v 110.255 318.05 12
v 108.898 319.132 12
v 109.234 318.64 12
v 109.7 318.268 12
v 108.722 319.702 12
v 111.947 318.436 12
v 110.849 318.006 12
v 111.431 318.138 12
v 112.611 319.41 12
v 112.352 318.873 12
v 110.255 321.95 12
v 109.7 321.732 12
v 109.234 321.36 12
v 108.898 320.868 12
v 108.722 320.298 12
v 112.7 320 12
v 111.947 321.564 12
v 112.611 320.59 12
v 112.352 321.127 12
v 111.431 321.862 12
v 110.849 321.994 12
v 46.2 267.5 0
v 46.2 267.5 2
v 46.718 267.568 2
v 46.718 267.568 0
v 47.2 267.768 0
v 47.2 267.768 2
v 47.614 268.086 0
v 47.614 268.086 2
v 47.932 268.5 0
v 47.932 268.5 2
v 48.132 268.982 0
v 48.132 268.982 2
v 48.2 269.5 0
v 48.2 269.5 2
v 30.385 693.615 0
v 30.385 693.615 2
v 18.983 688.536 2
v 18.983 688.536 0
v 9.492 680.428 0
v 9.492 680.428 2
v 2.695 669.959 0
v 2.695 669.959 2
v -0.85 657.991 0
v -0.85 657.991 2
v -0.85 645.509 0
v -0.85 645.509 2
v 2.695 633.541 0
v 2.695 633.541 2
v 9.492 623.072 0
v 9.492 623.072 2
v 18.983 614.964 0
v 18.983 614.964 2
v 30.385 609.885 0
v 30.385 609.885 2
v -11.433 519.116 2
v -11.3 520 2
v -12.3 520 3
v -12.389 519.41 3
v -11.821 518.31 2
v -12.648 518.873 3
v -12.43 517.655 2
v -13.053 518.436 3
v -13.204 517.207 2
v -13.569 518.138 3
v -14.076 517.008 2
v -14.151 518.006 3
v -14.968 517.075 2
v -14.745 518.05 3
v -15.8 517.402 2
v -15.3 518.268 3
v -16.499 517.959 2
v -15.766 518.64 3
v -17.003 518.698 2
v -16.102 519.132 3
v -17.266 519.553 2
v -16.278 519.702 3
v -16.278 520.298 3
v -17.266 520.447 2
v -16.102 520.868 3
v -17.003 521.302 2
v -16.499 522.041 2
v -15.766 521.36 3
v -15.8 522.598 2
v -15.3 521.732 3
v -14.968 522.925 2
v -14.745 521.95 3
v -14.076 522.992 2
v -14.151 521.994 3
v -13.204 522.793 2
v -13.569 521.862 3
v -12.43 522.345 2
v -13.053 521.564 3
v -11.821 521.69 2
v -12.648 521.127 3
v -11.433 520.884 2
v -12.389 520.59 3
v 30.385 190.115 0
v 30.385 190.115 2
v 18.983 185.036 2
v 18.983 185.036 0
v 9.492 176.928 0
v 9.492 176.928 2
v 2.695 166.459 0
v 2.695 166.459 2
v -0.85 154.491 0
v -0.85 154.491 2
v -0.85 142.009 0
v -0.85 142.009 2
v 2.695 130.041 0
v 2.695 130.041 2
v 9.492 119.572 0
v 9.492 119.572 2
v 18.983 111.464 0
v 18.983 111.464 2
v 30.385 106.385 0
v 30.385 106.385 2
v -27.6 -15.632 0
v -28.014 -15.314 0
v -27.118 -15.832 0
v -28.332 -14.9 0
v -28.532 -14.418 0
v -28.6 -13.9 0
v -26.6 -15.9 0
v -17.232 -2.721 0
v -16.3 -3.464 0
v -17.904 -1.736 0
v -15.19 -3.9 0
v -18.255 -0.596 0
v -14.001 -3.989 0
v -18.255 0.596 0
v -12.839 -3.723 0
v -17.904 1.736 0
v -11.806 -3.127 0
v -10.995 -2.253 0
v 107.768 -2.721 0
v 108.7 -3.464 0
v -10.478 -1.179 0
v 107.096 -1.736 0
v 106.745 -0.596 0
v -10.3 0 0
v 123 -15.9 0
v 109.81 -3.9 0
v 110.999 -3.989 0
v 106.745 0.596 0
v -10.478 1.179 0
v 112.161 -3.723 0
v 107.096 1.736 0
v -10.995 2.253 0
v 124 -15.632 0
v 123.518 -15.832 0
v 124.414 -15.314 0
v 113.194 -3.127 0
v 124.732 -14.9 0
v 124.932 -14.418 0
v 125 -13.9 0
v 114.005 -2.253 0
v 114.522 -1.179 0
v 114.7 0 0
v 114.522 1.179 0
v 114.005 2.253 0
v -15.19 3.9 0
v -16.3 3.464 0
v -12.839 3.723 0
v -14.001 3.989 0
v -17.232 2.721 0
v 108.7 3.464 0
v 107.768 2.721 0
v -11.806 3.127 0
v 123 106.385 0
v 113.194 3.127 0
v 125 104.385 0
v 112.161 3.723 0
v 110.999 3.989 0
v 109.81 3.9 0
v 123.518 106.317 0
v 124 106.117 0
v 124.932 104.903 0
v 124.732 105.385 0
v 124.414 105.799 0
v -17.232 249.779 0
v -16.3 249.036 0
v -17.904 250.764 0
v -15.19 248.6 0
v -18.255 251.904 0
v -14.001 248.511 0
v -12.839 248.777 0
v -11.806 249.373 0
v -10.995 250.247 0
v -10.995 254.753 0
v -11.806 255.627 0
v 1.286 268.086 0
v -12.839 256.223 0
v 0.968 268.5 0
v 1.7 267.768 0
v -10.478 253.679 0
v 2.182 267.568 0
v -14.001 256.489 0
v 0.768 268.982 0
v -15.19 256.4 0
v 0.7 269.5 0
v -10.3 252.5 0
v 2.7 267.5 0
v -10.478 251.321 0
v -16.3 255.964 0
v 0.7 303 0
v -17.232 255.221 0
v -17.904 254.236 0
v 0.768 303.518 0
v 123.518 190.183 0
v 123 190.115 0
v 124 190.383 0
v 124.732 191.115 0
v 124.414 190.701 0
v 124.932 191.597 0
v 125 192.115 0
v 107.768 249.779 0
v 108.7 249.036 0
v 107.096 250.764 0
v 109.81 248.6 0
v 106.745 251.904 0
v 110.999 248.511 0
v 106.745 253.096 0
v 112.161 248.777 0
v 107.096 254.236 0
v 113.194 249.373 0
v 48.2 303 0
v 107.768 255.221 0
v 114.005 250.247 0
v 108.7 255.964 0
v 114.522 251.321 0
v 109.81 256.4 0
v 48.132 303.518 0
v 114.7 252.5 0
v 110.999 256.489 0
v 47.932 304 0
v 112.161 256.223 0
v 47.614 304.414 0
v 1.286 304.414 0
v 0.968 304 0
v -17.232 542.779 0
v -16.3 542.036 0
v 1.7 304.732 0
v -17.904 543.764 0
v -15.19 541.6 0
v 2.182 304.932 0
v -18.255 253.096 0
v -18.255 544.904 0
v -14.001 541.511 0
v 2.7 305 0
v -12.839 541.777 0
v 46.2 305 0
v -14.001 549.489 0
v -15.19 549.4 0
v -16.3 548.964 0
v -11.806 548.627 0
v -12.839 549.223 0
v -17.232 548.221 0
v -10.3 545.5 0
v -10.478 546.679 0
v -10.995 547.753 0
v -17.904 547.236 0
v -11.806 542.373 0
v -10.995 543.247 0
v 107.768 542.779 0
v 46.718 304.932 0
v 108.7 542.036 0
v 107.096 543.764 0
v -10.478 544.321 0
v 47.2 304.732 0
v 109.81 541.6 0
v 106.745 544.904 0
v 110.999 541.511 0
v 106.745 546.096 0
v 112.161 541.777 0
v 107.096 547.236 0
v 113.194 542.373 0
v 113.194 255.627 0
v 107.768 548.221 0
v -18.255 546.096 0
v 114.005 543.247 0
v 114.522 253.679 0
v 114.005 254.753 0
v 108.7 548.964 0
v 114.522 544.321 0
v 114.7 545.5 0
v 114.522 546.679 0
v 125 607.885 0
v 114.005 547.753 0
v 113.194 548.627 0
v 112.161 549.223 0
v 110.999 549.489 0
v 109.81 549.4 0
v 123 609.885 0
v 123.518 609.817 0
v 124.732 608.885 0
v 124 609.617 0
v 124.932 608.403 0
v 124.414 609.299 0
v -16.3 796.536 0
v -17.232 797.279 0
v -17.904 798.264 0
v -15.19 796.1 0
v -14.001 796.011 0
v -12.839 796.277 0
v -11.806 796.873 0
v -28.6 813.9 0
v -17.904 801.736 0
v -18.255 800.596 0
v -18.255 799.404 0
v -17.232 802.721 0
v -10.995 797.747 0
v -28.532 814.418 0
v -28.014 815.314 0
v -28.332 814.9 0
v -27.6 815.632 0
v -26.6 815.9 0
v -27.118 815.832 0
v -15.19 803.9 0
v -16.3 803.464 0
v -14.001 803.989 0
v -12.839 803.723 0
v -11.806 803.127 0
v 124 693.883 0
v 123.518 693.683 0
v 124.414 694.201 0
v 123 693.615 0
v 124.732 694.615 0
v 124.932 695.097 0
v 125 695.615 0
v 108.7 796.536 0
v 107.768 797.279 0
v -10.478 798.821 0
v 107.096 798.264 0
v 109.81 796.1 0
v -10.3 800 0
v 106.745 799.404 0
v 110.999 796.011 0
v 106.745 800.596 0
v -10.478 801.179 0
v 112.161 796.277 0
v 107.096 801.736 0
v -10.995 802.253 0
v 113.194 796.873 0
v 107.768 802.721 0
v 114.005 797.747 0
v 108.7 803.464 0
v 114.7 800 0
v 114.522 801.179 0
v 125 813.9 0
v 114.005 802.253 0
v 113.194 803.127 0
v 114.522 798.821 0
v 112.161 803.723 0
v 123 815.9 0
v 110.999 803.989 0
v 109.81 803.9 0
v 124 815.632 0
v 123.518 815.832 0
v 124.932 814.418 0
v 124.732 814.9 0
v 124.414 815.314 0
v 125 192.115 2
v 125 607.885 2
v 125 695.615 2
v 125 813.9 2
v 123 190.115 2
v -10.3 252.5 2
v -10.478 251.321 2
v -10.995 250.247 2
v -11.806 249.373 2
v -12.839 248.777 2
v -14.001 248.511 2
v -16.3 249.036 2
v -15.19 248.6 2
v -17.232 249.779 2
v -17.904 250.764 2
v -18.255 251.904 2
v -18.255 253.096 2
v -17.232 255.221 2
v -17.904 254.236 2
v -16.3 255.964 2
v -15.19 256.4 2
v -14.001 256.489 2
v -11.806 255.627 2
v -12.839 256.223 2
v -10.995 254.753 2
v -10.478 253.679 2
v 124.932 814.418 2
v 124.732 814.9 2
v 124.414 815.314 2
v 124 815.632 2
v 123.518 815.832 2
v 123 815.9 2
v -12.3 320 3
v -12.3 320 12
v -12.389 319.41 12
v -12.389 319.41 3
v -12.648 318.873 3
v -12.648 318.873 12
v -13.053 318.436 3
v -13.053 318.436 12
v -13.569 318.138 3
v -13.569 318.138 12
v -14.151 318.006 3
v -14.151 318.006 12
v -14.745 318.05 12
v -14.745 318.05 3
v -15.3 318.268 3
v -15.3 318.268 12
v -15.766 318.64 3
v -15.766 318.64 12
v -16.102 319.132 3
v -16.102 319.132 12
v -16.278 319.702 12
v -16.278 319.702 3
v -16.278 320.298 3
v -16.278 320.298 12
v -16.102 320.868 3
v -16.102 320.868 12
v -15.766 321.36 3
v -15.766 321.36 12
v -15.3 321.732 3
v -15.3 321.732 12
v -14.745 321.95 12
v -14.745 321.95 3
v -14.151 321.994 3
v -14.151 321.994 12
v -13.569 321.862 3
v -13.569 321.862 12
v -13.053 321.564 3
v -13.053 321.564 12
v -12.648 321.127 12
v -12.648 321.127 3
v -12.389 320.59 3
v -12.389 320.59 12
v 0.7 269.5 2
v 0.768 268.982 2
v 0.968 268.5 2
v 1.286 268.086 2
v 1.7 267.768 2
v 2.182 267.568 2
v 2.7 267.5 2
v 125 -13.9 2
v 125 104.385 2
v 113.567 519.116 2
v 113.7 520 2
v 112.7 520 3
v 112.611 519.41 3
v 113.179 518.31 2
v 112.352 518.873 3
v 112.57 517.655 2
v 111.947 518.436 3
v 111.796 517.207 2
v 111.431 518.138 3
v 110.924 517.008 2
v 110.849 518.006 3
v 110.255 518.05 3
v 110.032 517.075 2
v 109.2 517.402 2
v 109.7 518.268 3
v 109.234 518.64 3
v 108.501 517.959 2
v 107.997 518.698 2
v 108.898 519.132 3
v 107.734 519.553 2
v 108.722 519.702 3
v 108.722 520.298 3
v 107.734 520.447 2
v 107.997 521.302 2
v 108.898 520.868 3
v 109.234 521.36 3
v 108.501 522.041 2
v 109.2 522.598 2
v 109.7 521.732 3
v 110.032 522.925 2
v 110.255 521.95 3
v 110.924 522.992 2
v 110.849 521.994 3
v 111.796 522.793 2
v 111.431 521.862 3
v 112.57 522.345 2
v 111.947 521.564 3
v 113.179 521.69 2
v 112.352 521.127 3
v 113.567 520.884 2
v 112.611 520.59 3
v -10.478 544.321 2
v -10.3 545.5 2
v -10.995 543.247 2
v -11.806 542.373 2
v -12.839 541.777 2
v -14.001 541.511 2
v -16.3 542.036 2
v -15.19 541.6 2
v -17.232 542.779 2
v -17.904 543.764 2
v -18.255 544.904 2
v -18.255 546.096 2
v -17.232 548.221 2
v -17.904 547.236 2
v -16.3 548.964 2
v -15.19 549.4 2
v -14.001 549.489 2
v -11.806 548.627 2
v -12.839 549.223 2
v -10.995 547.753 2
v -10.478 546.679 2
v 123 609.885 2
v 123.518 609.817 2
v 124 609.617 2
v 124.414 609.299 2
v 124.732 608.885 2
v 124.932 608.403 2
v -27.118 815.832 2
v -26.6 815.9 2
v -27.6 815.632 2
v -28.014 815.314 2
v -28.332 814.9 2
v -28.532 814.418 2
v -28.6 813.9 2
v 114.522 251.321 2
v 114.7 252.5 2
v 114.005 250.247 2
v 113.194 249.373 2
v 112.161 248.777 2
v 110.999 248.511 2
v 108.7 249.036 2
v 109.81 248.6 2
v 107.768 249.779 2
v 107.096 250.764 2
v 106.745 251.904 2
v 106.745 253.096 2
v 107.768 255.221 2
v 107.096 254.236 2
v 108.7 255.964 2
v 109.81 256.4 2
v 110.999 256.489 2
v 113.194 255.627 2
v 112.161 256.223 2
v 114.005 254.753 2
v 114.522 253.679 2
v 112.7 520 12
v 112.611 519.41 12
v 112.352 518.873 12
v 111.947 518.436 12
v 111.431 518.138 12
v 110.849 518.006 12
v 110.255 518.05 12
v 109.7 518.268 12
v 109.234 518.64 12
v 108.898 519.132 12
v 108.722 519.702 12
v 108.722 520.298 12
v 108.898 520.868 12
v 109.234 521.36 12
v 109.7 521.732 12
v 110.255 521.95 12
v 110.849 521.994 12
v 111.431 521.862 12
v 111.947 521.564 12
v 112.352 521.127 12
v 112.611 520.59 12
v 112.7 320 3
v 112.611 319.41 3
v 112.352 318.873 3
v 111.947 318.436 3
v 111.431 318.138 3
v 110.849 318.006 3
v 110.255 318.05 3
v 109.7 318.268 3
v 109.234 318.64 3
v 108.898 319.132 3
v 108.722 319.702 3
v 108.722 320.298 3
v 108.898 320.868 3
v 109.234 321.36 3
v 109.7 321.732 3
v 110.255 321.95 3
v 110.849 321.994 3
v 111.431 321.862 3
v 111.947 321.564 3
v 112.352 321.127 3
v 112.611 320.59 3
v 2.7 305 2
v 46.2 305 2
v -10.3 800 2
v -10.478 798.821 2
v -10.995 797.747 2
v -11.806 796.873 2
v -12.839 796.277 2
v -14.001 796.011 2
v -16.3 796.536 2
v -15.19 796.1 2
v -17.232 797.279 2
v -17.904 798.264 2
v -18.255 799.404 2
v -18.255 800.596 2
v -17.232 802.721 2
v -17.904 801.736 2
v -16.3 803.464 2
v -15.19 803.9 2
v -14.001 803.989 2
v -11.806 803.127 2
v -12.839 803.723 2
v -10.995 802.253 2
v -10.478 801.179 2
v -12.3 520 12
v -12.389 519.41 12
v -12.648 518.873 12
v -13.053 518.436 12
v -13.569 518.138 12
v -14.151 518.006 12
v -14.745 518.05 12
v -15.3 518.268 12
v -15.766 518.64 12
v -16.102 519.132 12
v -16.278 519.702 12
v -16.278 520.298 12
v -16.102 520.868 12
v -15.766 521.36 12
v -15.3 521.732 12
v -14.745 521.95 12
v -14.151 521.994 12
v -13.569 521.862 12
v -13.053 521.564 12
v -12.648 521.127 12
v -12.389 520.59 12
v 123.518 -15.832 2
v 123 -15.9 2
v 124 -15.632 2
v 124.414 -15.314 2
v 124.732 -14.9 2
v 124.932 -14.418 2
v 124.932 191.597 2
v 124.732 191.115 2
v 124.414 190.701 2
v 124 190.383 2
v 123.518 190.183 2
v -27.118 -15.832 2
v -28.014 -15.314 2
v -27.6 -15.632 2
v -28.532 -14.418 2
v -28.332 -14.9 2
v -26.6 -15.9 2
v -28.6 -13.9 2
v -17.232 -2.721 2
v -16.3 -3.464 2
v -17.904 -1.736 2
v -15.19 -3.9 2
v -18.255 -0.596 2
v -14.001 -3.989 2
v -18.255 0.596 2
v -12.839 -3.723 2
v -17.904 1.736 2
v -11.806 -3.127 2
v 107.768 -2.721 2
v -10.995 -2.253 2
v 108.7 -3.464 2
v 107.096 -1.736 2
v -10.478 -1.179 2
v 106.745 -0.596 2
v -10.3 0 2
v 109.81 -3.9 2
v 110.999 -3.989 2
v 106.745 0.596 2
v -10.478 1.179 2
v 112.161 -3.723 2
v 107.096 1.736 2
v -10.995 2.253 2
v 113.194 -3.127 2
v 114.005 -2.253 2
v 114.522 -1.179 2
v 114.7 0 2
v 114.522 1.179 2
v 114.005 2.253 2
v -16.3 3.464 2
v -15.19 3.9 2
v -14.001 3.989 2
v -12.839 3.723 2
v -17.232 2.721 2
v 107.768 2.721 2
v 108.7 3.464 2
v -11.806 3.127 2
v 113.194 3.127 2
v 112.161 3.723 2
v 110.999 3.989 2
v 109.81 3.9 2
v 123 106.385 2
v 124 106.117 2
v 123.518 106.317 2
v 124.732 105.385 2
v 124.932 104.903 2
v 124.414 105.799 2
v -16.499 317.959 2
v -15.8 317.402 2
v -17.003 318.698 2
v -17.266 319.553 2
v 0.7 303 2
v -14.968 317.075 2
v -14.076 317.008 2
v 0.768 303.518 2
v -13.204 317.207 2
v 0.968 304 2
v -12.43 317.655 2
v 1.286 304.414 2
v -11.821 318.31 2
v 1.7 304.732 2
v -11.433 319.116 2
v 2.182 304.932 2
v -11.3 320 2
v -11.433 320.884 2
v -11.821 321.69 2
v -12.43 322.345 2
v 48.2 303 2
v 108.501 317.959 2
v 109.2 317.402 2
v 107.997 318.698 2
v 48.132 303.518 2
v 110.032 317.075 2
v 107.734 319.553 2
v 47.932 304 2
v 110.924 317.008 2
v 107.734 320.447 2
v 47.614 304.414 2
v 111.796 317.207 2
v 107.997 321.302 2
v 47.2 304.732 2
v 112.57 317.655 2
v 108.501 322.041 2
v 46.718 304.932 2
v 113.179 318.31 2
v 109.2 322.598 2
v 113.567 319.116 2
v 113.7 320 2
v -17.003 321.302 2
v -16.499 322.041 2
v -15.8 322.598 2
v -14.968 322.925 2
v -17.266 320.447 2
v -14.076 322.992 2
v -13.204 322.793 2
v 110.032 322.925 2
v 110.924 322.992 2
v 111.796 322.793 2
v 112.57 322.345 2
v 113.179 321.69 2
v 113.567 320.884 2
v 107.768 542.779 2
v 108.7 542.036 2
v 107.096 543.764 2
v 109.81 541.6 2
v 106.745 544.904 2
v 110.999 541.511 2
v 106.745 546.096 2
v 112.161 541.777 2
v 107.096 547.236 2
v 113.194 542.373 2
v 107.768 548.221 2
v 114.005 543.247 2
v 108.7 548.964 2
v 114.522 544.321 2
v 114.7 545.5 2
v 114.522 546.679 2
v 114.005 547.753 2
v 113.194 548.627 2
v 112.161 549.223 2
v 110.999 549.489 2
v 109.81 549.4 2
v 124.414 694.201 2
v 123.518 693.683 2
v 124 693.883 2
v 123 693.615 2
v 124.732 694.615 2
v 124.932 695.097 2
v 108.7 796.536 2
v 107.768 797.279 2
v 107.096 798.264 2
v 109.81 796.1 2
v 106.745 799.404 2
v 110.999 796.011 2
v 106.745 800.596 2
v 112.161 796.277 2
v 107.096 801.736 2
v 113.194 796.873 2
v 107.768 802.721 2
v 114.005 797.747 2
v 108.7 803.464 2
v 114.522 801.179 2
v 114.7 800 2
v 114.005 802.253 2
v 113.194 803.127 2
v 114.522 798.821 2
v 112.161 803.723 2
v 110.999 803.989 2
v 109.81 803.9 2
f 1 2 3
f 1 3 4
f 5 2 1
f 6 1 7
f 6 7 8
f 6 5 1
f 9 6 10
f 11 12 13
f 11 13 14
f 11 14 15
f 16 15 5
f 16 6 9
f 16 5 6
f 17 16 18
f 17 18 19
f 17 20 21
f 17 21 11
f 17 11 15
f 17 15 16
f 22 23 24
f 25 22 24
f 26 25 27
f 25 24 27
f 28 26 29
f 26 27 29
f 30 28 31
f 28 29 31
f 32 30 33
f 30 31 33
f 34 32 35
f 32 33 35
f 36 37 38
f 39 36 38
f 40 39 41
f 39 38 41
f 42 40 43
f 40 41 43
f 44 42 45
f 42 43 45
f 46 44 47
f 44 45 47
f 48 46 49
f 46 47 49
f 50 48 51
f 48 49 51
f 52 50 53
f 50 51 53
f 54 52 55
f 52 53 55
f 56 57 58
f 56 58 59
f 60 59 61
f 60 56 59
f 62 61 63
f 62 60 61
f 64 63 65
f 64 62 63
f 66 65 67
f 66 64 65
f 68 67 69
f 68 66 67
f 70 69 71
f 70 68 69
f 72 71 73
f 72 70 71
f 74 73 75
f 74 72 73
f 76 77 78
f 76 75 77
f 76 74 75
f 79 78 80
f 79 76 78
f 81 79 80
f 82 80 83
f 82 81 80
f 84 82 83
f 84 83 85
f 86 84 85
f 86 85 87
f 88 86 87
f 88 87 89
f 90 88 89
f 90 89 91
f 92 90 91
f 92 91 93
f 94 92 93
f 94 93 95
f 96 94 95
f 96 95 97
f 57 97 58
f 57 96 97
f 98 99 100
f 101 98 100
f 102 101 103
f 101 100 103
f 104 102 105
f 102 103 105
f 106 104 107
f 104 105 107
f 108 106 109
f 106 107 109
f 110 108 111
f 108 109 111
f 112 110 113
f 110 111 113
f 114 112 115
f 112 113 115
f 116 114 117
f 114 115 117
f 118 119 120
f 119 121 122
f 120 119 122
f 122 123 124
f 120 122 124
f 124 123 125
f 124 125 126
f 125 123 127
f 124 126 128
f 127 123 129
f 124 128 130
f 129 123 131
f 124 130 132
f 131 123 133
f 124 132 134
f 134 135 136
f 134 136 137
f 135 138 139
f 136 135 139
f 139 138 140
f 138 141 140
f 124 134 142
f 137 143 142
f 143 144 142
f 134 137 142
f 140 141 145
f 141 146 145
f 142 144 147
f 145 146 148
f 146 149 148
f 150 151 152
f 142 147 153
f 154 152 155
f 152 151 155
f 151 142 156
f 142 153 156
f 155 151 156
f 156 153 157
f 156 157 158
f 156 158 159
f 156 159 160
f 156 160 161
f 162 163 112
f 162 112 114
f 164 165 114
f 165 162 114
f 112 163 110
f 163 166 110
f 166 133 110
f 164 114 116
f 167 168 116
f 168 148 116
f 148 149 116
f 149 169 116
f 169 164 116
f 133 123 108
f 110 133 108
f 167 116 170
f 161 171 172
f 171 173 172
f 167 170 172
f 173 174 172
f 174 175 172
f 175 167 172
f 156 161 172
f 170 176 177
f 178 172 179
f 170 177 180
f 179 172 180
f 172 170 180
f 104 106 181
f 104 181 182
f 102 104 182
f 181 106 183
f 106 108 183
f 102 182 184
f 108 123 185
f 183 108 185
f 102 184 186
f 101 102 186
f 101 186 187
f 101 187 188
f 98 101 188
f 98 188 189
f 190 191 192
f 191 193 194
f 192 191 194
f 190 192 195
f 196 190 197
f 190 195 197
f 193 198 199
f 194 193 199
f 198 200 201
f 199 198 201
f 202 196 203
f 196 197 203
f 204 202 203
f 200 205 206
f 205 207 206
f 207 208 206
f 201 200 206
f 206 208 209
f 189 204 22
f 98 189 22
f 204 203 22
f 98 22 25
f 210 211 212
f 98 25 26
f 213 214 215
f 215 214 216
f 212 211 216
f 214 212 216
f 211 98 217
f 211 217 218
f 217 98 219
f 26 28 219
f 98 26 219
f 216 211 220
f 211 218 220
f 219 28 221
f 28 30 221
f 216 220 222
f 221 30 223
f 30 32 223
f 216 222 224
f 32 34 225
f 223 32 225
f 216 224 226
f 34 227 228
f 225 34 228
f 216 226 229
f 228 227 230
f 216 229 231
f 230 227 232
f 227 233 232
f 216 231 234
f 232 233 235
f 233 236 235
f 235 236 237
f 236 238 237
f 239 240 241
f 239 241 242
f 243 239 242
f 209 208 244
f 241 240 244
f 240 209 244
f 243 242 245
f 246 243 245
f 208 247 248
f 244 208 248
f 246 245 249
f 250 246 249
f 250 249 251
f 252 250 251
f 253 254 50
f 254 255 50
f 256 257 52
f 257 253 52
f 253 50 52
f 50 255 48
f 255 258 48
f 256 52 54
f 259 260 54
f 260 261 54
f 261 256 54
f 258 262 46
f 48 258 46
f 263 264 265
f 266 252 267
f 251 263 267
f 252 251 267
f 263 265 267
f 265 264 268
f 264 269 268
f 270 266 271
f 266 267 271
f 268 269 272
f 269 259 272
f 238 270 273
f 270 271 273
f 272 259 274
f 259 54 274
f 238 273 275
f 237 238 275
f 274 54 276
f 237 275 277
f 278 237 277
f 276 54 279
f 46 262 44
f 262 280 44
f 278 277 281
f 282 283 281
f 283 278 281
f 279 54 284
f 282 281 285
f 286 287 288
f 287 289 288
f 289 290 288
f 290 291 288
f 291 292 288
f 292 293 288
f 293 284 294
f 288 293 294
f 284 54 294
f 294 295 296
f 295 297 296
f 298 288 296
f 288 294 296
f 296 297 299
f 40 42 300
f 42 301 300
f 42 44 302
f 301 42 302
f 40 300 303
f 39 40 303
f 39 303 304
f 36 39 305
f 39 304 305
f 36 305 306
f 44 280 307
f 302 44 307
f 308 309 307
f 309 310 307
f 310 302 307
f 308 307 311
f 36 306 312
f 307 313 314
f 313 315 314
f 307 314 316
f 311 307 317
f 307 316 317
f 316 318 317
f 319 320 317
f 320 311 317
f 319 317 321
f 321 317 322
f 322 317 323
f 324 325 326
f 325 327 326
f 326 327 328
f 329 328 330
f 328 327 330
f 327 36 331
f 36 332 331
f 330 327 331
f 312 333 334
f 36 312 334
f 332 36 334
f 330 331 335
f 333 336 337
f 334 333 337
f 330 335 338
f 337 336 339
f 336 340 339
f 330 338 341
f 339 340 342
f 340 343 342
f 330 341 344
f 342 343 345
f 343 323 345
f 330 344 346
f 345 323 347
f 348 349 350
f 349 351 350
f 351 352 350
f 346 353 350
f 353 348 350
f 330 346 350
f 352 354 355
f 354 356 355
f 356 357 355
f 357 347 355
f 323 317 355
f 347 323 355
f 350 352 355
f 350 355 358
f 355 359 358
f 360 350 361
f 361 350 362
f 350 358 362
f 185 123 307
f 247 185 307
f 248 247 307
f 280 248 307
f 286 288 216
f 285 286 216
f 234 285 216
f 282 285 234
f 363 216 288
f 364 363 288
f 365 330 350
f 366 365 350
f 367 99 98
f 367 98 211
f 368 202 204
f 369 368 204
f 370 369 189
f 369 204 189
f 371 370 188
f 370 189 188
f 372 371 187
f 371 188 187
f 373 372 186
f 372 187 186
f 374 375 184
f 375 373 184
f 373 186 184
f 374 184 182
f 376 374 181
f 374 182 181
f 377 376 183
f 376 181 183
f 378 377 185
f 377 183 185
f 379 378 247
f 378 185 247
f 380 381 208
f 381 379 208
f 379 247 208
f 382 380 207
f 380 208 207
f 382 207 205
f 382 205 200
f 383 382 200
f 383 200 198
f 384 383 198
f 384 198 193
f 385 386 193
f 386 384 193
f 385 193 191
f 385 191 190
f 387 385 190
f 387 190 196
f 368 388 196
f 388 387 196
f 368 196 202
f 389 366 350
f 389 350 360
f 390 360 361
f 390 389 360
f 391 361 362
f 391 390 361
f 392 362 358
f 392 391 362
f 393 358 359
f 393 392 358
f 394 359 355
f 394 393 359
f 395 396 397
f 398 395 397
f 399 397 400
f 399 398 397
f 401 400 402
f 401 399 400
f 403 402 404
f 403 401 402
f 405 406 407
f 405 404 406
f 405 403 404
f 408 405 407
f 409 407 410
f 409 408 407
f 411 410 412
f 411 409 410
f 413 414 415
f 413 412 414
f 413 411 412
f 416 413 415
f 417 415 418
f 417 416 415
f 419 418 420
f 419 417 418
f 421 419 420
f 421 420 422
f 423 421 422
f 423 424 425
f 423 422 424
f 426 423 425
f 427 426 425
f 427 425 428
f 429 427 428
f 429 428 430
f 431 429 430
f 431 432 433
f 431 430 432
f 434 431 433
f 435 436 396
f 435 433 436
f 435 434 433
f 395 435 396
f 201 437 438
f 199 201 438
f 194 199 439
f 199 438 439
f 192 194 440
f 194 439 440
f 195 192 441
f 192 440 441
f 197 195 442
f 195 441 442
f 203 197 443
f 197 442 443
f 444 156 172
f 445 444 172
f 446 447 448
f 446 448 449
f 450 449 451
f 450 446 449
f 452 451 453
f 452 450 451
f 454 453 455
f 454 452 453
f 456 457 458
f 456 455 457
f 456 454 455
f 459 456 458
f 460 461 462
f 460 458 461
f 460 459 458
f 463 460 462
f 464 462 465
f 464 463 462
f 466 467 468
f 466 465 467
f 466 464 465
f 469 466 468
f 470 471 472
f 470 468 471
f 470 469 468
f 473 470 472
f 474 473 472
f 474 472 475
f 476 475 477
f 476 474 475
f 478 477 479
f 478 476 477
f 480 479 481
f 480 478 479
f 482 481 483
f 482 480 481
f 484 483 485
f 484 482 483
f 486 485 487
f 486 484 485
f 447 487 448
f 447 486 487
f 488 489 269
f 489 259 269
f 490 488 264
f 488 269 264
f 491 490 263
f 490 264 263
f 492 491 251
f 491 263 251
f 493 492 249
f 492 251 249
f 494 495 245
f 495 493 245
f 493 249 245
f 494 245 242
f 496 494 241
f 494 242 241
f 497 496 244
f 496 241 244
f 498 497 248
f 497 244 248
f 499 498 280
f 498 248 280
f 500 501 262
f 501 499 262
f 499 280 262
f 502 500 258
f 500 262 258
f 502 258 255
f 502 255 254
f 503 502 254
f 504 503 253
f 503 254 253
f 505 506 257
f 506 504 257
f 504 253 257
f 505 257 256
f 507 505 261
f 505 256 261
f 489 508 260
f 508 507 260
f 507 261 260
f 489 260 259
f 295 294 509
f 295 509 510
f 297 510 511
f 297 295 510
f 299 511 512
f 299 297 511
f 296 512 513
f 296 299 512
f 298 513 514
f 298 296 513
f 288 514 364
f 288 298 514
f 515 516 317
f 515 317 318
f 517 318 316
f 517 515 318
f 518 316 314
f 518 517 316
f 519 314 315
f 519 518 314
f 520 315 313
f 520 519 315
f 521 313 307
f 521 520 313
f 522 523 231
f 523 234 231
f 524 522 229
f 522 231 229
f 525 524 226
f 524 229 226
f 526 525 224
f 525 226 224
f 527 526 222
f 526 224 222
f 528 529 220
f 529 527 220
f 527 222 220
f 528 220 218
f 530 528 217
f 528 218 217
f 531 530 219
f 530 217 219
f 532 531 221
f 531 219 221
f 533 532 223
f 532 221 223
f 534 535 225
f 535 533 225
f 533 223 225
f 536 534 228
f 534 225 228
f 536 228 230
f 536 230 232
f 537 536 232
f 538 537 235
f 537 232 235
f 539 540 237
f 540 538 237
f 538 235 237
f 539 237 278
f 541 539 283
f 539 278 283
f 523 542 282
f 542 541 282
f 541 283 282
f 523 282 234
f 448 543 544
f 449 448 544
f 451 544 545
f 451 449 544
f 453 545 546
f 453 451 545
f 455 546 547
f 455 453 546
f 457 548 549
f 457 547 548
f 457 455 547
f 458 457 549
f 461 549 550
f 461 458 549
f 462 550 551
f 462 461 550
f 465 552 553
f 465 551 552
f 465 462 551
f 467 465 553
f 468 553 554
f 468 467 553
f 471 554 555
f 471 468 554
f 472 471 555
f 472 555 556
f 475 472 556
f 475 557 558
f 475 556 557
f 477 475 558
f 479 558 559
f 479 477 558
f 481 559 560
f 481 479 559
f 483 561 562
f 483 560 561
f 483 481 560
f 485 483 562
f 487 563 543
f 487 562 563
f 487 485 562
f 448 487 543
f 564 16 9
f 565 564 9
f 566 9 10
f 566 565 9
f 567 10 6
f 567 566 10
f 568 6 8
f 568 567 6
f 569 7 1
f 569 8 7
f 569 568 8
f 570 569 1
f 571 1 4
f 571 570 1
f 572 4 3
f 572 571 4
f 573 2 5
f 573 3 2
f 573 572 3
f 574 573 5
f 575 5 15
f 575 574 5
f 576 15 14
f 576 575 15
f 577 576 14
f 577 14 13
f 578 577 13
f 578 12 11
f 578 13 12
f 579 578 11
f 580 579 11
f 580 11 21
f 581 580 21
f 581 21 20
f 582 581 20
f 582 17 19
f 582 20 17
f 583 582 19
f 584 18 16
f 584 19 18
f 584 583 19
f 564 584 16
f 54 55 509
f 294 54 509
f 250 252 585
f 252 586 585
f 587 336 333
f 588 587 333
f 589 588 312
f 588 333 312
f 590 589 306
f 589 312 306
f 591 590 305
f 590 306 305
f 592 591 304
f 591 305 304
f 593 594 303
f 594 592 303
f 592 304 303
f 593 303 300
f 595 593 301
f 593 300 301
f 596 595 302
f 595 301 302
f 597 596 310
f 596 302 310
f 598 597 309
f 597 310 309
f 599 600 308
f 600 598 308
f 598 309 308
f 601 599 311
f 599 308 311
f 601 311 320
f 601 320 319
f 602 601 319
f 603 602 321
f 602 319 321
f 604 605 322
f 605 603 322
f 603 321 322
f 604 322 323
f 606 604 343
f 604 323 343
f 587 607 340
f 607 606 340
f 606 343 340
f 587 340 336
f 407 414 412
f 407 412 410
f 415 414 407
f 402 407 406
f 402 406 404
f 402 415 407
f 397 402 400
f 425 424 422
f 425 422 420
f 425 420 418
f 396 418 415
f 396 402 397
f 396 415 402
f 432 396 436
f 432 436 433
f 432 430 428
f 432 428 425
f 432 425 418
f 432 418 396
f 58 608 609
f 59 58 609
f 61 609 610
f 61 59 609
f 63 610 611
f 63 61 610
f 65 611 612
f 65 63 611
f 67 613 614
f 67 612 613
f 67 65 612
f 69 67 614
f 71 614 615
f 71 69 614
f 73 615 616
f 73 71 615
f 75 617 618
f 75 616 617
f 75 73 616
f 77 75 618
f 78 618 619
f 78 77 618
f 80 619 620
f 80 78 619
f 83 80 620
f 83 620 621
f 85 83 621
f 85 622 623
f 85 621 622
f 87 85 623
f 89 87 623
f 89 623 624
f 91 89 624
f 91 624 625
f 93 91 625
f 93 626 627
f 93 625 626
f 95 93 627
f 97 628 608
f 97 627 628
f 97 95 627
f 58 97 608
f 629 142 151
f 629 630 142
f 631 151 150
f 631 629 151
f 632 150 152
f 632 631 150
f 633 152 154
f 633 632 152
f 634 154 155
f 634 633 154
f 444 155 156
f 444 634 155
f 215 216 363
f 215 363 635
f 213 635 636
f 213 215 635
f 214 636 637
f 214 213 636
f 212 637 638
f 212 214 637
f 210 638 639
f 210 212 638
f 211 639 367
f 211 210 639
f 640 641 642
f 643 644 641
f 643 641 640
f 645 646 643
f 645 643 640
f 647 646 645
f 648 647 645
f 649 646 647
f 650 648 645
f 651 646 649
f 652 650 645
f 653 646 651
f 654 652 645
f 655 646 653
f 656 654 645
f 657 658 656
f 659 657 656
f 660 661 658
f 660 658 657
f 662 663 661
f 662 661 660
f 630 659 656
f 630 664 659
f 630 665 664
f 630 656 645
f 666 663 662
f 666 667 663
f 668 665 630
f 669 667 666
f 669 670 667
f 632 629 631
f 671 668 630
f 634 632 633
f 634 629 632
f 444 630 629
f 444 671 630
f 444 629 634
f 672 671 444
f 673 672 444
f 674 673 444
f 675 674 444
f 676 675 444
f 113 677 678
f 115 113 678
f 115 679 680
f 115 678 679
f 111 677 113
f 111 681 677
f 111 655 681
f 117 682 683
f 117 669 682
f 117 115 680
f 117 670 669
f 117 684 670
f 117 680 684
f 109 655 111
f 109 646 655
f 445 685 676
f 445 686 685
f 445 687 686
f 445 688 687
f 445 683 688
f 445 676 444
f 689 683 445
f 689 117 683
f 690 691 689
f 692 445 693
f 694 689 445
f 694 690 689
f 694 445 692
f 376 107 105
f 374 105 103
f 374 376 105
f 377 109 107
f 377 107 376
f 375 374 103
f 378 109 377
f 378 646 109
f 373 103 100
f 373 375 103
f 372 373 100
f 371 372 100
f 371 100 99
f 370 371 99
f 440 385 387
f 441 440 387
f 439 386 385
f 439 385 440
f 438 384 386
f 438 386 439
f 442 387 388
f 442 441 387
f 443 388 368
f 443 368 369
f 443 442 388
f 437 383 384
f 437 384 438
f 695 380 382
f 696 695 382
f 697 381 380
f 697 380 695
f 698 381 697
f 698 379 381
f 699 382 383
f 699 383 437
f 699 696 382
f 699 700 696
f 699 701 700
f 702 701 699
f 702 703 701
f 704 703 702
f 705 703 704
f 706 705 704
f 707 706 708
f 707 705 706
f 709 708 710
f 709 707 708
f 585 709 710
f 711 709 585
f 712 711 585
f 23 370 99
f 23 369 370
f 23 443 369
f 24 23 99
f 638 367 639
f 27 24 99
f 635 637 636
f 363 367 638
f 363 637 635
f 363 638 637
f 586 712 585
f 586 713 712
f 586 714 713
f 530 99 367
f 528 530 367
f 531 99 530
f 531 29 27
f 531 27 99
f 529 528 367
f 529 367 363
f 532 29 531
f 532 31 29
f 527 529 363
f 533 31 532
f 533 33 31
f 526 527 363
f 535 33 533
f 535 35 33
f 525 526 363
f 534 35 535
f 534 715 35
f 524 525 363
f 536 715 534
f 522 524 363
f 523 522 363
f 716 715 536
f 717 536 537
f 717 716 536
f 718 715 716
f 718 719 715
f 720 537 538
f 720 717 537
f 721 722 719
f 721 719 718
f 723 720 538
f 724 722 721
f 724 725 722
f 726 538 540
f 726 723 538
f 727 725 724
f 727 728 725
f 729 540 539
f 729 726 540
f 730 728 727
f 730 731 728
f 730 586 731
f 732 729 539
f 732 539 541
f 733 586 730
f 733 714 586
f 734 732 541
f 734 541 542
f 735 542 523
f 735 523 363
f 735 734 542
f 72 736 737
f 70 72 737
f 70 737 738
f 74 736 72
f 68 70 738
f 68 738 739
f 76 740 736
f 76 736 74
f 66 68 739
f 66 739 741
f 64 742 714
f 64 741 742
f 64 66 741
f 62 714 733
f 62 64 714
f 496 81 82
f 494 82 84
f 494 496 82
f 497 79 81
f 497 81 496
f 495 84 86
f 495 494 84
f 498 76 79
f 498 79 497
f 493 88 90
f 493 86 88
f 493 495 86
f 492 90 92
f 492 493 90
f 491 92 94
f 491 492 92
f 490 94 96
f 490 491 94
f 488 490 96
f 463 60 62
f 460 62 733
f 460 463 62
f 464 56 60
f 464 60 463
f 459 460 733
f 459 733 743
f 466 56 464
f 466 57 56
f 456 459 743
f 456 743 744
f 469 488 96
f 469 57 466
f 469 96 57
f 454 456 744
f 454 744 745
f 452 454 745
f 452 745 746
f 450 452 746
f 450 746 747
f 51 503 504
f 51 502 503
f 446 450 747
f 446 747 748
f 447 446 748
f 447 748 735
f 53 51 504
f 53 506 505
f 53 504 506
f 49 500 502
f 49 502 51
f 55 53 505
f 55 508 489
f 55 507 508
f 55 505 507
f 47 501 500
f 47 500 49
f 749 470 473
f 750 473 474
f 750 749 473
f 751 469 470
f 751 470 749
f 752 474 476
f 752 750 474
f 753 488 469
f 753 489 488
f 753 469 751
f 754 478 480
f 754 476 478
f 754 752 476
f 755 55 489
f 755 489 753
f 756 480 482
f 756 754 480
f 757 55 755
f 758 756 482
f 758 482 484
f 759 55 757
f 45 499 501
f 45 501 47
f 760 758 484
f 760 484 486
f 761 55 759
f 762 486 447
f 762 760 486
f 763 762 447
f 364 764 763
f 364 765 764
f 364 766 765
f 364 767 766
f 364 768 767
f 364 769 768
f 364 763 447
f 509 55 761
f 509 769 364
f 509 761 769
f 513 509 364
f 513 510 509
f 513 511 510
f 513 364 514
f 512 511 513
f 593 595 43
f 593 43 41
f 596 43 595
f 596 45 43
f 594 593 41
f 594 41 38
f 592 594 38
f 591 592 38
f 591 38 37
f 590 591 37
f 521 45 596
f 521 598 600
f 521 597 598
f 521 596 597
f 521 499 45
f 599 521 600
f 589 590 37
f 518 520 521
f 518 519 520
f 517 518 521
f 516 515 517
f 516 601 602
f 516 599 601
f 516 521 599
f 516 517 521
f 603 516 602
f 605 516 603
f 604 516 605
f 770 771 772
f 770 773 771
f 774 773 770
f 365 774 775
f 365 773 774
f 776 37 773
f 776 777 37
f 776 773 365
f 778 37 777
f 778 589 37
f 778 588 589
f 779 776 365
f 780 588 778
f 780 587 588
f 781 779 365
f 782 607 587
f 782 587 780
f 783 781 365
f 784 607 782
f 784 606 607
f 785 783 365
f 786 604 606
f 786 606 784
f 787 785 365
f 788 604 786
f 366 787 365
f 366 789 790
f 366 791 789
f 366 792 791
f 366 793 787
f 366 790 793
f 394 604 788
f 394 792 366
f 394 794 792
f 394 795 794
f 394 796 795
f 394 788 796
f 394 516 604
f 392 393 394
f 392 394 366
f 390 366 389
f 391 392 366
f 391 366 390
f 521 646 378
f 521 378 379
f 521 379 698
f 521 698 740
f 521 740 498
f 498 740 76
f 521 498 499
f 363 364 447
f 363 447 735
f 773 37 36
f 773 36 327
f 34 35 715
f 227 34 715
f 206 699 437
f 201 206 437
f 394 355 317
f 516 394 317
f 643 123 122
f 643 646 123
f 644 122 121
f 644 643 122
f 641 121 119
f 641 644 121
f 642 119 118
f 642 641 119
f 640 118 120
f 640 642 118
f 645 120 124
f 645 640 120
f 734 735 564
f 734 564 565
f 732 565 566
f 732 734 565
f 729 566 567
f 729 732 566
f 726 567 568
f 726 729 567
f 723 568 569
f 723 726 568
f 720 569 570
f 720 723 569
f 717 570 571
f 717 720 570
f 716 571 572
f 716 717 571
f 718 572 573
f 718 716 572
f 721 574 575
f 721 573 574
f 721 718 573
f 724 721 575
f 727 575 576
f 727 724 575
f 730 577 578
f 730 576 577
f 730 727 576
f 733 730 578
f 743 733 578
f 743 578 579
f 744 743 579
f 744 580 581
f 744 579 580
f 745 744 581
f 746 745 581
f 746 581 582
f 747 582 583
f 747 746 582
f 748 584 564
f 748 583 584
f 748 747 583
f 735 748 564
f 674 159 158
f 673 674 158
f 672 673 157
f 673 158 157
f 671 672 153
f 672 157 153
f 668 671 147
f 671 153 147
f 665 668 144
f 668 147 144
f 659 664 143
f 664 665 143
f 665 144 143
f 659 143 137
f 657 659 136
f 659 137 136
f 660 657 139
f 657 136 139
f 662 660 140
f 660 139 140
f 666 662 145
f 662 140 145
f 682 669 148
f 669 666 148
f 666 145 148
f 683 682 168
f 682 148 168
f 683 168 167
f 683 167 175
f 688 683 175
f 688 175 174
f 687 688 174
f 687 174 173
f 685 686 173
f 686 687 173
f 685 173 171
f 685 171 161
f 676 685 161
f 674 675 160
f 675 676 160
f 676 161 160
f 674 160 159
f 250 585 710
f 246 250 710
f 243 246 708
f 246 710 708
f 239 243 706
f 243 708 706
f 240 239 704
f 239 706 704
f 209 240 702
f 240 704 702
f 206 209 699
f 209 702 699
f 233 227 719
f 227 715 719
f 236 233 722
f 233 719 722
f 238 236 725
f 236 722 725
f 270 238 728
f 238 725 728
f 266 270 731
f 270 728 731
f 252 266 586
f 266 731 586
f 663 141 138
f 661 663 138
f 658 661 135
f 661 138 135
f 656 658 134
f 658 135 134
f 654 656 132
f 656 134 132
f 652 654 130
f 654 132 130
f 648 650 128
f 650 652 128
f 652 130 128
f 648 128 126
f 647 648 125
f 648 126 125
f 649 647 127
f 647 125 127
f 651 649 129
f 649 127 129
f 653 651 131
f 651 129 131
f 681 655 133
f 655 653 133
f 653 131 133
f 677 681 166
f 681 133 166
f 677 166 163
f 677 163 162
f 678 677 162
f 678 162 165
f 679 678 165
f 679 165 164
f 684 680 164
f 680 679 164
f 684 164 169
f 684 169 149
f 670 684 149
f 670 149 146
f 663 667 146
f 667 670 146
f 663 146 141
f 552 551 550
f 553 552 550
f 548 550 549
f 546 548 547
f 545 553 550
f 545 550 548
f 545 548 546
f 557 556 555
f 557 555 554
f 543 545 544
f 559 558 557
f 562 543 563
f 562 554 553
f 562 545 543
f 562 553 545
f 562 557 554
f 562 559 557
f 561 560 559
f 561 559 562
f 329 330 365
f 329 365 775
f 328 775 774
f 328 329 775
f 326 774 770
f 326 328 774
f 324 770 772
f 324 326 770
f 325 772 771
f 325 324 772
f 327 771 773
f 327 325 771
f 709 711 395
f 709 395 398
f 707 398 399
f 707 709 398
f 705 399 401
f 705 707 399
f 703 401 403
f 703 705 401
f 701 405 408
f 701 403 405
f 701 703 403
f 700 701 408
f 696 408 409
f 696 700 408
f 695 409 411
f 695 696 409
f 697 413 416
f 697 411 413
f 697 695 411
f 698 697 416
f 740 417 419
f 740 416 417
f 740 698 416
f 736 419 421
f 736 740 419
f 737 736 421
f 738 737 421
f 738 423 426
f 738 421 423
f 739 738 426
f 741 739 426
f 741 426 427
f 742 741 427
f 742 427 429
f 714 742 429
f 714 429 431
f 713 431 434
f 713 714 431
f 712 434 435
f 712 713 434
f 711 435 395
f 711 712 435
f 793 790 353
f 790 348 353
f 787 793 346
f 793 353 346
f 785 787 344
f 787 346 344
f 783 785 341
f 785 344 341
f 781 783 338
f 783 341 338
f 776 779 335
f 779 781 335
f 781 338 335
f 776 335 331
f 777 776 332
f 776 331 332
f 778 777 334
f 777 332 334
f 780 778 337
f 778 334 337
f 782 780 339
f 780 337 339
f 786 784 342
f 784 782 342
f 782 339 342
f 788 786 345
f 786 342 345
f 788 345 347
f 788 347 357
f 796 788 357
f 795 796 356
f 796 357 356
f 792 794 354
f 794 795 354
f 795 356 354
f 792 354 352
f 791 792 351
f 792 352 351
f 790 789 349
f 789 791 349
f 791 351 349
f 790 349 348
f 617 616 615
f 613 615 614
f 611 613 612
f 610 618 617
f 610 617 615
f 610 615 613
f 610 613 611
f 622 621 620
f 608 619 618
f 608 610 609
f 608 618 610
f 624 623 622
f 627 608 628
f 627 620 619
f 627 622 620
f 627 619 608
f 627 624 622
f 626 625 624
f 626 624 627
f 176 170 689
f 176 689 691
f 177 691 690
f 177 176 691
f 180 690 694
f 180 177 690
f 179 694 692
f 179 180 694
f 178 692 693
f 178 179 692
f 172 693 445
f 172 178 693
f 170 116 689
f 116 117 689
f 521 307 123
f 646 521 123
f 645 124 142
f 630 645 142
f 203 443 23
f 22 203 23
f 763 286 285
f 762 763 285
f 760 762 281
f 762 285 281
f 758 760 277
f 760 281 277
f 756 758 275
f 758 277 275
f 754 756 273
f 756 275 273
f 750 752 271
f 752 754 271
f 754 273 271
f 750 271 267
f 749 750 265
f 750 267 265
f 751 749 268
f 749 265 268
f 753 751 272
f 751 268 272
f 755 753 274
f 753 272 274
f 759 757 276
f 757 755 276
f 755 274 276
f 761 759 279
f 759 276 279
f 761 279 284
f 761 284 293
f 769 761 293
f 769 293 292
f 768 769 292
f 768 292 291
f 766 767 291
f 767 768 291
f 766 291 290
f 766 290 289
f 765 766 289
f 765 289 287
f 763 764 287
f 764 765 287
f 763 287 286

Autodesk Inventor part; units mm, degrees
ref_plane "YZ Plane" through (0, 0, 0) normal (1, 0, 0) x (0, 1, 0)
ref_plane "XZ Plane" through (0, 0, 0) normal (0, 1, 0) x (-1, 0, 0)
ref_plane "XY Plane" through (0, 0, 0) normal (0, 0, 1) x (1, 0, 0)
sketch "Sketch1" plane through (0, 0, 0) normal (0, 0, 1) x (1, 0, 0)
  line L0 (-28.6, -15.9) -> (0, -15.9) construction
  line L1 (-28.6, 817.5) -> (-28.6, -17.5) construction
  line L2 (125, 817.5) -> (125, -17.5) construction
  line L3 (96.4, -15.9) -> (125, -15.9) construction
  line L4 (-28.6, 815.9) -> (0, 815.9) construction
  line L5 (96.4, 815.9) -> (125, 815.9) construction
  circle A0 centre (-14.3, 0) radius 2 construction
  circle A1 centre (110.7, 0) radius 2 construction
  circle A2 centre (-14.3, 252.5) radius 2 construction
  circle A3 centre (110.7, 252.5) radius 2 construction
  circle A4 centre (-14.3, 545.5) radius 2 construction
  circle A5 centre (110.7, 545.5) radius 2 construction
  circle A6 centre (-14.3, 800) radius 2 construction
  circle A7 centre (110.7, 800) radius 2 construction
  line L6 (-28.6, -15.9) -> (125, -15.9)
  line L7 (125, -15.9) -> (125, 815.9)
  line L8 (125, 815.9) -> (-28.6, 815.9)
  line L9 (-28.6, 815.9) -> (-28.6, -15.9)
  circle A8 centre (-14.3, 0) radius 4
  circle A9 centre (110.7, 0) radius 4
  circle A10 centre (-14.3, 252.5) radius 4
  circle A11 centre (110.7, 252.5) radius 4
  circle A12 centre (-14.3, 545.5) radius 4
  circle A13 centre (110.7, 545.5) radius 4
  circle A14 centre (-14.3, 800) radius 4
  circle A15 centre (110.7, 800) radius 4
  point P0 (0, 0)
  dimension "d0" = 2
  dimension "d1" = 2
  dimension "d2" = 2
  dimension "d3" = 2
  dimension "d4" = 2
  dimension "d5" = 2
  dimension "d6" = 2
  dimension "d7" = 2
extrude "Extrusion1" add sketch "Sketch1" along normal blind 2
sketch "Sketch2" plane through (0, 0, 2) normal (0, 0, 1) x (1, 0, 0)
  arc A0 (81.2, 144.25) -> (81.2, 152.25) centre (81.2, 148.25) ccw construction
  arc A1 (79.0077, 648.4043) -> (79.0077, 655.0957) centre (81.2, 651.75) ccw construction
  arc A2 (33.1012, 180.4907) -> (33.1012, 116.0093) centre (42.2, 148.25) ccw construction
  arc A3 (33.1012, 683.9907) -> (33.1012, 619.5093) centre (42.2, 651.75) ccw construction
  arc A4 (30.3852, 190.1148) -> (30.3852, 106.3852) centre (42.2, 148.25) ccw
  arc A5 (30.3852, 693.6148) -> (30.3852, 609.8852) centre (42.2, 651.75) ccw
  line L0 (125, -15.9) -> (125, 815.9) construction
  line L1 (30.3852, 106.3852) -> (125, 106.3852)
  line L2 (30.3852, 190.1148) -> (125, 190.1148)
  line L3 (30.3852, 609.8852) -> (125, 609.8852)
  line L4 (30.3852, 693.6148) -> (125, 693.6148)
  line L5 (125, 106.3852) -> (125, 190.1148)
  line L6 (125, 609.8852) -> (125, 693.6148)
  point P0 (0, 0)
  dimension "d10" = 10
  dimension "d11" = 10
  dimension "d16" = 83.7296
  dimension "d17" = 83.7296
  dimension "d18" = 41.8648
  dimension "d19" = 41.8648
extrude "Extrusion2" cut sketch "Sketch2" against normal blind 2
fillet "Fillet1" radius 2 8 edges at (-28.6, -15.9, 1) (125, -15.9, 1) (-28.6, 815.9, 1) (125, 815.9, 1) (125, 693.6148, 1) (125, 609.8852, 1) (125, 106.3852, 1) (125, 190.1148, 1)
sketch "Sketch3" plane through (0, 0, 2) normal (0, 0, 1) x (1, 0, 0)
  arc A0 (123, 190.1148) -> (125, 192.1148) centre (123, 192.1148) ccw construction
  line L0 (125, 192.1148) -> (125, 607.8852) construction
  arc A1 (125, 607.8852) -> (123, 609.8852) centre (123, 607.8852) ccw construction
  line L1 (123, 609.8852) -> (30.3852, 609.8852) construction
  arc A2 (30.3852, 693.6148) -> (30.3852, 609.8852) centre (42.2, 651.75) ccw construction
  line L2 (30.3852, 693.6148) -> (123, 693.6148) construction
  arc A3 (123, 693.6148) -> (125, 695.6148) centre (123, 695.6148) ccw construction
  line L3 (125, 695.6148) -> (125, 813.9) construction
  arc A4 (125, 813.9) -> (123, 815.9) centre (123, 813.9) ccw construction
  line L4 (123, 815.9) -> (-26.6, 815.9) construction
  arc A5 (-26.6, 815.9) -> (-28.6, 813.9) centre (-26.6, 813.9) ccw construction
  line L5 (-28.6, 813.9) -> (-28.6, -13.9) construction
  arc A6 (-28.6, -13.9) -> (-26.6, -15.9) centre (-26.6, -13.9) ccw construction
  line L6 (-26.6, -15.9) -> (123, -15.9) construction
  arc A7 (123, -15.9) -> (125, -13.9) centre (123, -13.9) ccw construction
  line L7 (125, -13.9) -> (125, 104.3852) construction
  arc A8 (125, 104.3852) -> (123, 106.3852) centre (123, 104.3852) ccw construction
  line L8 (123, 106.3852) -> (30.3852, 106.3852) construction
  arc A9 (30.3852, 190.1148) -> (30.3852, 106.3852) centre (42.2, 148.25) ccw construction
  line L9 (30.3852, 190.1148) -> (123, 190.1148) construction
  circle A10 centre (110.7, 800) radius 4 construction
  circle A11 centre (-14.3, 800) radius 4 construction
  circle A12 centre (110.7, 545.5) radius 4 construction
  circle A13 centre (-14.3, 545.5) radius 4 construction
  circle A14 centre (110.7, 252.5) radius 4 construction
  circle A15 centre (-14.3, 252.5) radius 4 construction
  circle A16 centre (110.7, 0) radius 4 construction
  circle A17 centre (-14.3, 0) radius 4 construction
  line L10 (-28.6, 813.9) -> (-28.6, -13.9) construction
  line L11 (-28.6, 400) -> (125, 400) construction
  line L12 (-28.6, 520) -> (125, 520) construction
  circle A18 centre (-14.3, 545.5) radius 4 construction
  line L13 (-28.6, 320) -> (125, 320) construction
  line L14 (-14.3, 545.5) -> (-14.3, 320) construction
  line L15 (110.7, 545.5) -> (110.7, 320) construction
  circle A19 centre (-14.3, 520) radius 2
  circle A20 centre (-14.3, 320) radius 2
  circle A21 centre (110.7, 320) radius 2
  circle A22 centre (110.7, 520) radius 2
  point P0 (0, 0)
  dimension "d24" = 120
  dimension "d25" = 200
  dimension "d26" = 4
  dimension "d27" = 4
  dimension "d28" = 4
  dimension "d29" = 4
extrude "Extrusion3" add sketch "Sketch3" along normal blind 10
chamfer "Chamfer1" distance 1 angle 45 4 edges at (-16.3, 320, 2) (-16.3, 520, 2) (108.7, 520, 2) (108.7, 320, 2)
thread "Thread1" size "M4x0.7" class "6g" standard "ANSI Metric M Profile" full length
thread "Thread2" size "M4x0.7" class "6g" standard "ANSI Metric M Profile" full length
thread "Thread3" size "M4x0.7" class "6g" standard "ANSI Metric M Profile" full length
thread "Thread4" size "M4x0.7" class "6g" standard "ANSI Metric M Profile" full length
sketch "Sketch4" plane through (0, 0, 2) normal (0, 0, 1) x (1, 0, 0)
  circle A0 centre (110.7, 520) radius 3 construction
  circle A1 centre (-14.3, 320) radius 3 construction
  arc A2 (123, 190.1148) -> (125, 192.1148) centre (123, 192.1148) ccw construction
  line L0 (125, 192.1148) -> (125, 607.8852) construction
  arc A3 (125, 607.8852) -> (123, 609.8852) centre (123, 607.8852) ccw construction
  line L1 (123, 609.8852) -> (30.3852, 609.8852) construction
  arc A4 (30.3852, 693.6148) -> (30.3852, 609.8852) centre (42.2, 651.75) ccw construction
  line L2 (30.3852, 693.6148) -> (123, 693.6148) construction
  arc A5 (123, 693.6148) -> (125, 695.6148) centre (123, 695.6148) ccw construction
  line L3 (125, 695.6148) -> (125, 813.9) construction
  arc A6 (125, 813.9) -> (123, 815.9) centre (123, 813.9) ccw construction
  line L4 (123, 815.9) -> (-26.6, 815.9) construction
  arc A7 (-26.6, 815.9) -> (-28.6, 813.9) centre (-26.6, 813.9) ccw construction
  line L5 (-28.6, 813.9) -> (-28.6, -13.9) construction
  arc A8 (-28.6, -13.9) -> (-26.6, -15.9) centre (-26.6, -13.9) ccw construction
  line L6 (-26.6, -15.9) -> (123, -15.9) construction
  arc A9 (123, -15.9) -> (125, -13.9) centre (123, -13.9) ccw construction
  line L7 (125, -13.9) -> (125, 104.3852) construction
  arc A10 (125, 104.3852) -> (123, 106.3852) centre (123, 104.3852) ccw construction
  line L8 (123, 106.3852) -> (30.3852, 106.3852) construction
  arc A11 (30.3852, 190.1148) -> (30.3852, 106.3852) centre (42.2, 148.25) ccw construction
  line L9 (30.3852, 190.1148) -> (123, 190.1148) construction
  circle A12 centre (110.7, 800) radius 4 construction
  circle A13 centre (-14.3, 800) radius 4 construction
  circle A14 centre (110.7, 545.5) radius 4 construction
  circle A15 centre (-14.3, 545.5) radius 4 construction
  circle A16 centre (110.7, 252.5) radius 4 construction
  circle A17 centre (-14.3, 252.5) radius 4 construction
  circle A18 centre (110.7, 0) radius 4 construction
  circle A19 centre (-14.3, 0) radius 4 construction
  circle A20 centre (-14.3, 520) radius 3 construction
  circle A21 centre (110.7, 320) radius 3 construction
  circle A22 centre (-14.3, 320) radius 2 construction
  circle A23 centre (110.7, 252.5) radius 4 construction
  line L10 (110.7, 252.5) -> (-14.3, 252.5) construction
  line L11 (-14.3, 252.5) -> (-14.3, 320) construction
  line L12 (-14.3, 320) -> (110.7, 320) construction
  line L13 (110.7, 320) -> (110.7, 252.5) construction
  line L14 (48.2, 252.5) -> (48.2, 320) construction
  line L15 (0.7, 267.5) -> (95.7, 267.5) construction
  line L16 (95.7, 267.5) -> (95.7, 305) construction
  line L17 (95.7, 305) -> (0.7, 305) construction
  line L18 (0.7, 305) -> (0.7, 267.5) construction
  line L19 (2.7, 267.5) -> (46.2, 267.5)
  line L20 (48.2, 269.5) -> (48.2, 303)
  line L21 (46.2, 305) -> (2.7, 305)
  line L22 (0.7, 303) -> (0.7, 269.5)
  arc A24 (0.7, 269.5) -> (2.7, 267.5) centre (2.7, 269.5) ccw
  arc A25 (2.7, 305) -> (0.7, 303) centre (2.7, 303) ccw
  arc A26 (46.2, 267.5) -> (48.2, 269.5) centre (46.2, 269.5) ccw
  arc A27 (48.2, 303) -> (46.2, 305) centre (46.2, 303) ccw
  point P0 (0, 0)
  point P1 (48.2, 305)
  dimension "d43" = 15
  dimension "d44" = 2
  dimension "d45" = 2
  dimension "d46" = 2
  dimension "d47" = 2
extrude "Extrusion4" cut sketch "Sketch4" against normal up to next
properties part number "Cover_Left"
